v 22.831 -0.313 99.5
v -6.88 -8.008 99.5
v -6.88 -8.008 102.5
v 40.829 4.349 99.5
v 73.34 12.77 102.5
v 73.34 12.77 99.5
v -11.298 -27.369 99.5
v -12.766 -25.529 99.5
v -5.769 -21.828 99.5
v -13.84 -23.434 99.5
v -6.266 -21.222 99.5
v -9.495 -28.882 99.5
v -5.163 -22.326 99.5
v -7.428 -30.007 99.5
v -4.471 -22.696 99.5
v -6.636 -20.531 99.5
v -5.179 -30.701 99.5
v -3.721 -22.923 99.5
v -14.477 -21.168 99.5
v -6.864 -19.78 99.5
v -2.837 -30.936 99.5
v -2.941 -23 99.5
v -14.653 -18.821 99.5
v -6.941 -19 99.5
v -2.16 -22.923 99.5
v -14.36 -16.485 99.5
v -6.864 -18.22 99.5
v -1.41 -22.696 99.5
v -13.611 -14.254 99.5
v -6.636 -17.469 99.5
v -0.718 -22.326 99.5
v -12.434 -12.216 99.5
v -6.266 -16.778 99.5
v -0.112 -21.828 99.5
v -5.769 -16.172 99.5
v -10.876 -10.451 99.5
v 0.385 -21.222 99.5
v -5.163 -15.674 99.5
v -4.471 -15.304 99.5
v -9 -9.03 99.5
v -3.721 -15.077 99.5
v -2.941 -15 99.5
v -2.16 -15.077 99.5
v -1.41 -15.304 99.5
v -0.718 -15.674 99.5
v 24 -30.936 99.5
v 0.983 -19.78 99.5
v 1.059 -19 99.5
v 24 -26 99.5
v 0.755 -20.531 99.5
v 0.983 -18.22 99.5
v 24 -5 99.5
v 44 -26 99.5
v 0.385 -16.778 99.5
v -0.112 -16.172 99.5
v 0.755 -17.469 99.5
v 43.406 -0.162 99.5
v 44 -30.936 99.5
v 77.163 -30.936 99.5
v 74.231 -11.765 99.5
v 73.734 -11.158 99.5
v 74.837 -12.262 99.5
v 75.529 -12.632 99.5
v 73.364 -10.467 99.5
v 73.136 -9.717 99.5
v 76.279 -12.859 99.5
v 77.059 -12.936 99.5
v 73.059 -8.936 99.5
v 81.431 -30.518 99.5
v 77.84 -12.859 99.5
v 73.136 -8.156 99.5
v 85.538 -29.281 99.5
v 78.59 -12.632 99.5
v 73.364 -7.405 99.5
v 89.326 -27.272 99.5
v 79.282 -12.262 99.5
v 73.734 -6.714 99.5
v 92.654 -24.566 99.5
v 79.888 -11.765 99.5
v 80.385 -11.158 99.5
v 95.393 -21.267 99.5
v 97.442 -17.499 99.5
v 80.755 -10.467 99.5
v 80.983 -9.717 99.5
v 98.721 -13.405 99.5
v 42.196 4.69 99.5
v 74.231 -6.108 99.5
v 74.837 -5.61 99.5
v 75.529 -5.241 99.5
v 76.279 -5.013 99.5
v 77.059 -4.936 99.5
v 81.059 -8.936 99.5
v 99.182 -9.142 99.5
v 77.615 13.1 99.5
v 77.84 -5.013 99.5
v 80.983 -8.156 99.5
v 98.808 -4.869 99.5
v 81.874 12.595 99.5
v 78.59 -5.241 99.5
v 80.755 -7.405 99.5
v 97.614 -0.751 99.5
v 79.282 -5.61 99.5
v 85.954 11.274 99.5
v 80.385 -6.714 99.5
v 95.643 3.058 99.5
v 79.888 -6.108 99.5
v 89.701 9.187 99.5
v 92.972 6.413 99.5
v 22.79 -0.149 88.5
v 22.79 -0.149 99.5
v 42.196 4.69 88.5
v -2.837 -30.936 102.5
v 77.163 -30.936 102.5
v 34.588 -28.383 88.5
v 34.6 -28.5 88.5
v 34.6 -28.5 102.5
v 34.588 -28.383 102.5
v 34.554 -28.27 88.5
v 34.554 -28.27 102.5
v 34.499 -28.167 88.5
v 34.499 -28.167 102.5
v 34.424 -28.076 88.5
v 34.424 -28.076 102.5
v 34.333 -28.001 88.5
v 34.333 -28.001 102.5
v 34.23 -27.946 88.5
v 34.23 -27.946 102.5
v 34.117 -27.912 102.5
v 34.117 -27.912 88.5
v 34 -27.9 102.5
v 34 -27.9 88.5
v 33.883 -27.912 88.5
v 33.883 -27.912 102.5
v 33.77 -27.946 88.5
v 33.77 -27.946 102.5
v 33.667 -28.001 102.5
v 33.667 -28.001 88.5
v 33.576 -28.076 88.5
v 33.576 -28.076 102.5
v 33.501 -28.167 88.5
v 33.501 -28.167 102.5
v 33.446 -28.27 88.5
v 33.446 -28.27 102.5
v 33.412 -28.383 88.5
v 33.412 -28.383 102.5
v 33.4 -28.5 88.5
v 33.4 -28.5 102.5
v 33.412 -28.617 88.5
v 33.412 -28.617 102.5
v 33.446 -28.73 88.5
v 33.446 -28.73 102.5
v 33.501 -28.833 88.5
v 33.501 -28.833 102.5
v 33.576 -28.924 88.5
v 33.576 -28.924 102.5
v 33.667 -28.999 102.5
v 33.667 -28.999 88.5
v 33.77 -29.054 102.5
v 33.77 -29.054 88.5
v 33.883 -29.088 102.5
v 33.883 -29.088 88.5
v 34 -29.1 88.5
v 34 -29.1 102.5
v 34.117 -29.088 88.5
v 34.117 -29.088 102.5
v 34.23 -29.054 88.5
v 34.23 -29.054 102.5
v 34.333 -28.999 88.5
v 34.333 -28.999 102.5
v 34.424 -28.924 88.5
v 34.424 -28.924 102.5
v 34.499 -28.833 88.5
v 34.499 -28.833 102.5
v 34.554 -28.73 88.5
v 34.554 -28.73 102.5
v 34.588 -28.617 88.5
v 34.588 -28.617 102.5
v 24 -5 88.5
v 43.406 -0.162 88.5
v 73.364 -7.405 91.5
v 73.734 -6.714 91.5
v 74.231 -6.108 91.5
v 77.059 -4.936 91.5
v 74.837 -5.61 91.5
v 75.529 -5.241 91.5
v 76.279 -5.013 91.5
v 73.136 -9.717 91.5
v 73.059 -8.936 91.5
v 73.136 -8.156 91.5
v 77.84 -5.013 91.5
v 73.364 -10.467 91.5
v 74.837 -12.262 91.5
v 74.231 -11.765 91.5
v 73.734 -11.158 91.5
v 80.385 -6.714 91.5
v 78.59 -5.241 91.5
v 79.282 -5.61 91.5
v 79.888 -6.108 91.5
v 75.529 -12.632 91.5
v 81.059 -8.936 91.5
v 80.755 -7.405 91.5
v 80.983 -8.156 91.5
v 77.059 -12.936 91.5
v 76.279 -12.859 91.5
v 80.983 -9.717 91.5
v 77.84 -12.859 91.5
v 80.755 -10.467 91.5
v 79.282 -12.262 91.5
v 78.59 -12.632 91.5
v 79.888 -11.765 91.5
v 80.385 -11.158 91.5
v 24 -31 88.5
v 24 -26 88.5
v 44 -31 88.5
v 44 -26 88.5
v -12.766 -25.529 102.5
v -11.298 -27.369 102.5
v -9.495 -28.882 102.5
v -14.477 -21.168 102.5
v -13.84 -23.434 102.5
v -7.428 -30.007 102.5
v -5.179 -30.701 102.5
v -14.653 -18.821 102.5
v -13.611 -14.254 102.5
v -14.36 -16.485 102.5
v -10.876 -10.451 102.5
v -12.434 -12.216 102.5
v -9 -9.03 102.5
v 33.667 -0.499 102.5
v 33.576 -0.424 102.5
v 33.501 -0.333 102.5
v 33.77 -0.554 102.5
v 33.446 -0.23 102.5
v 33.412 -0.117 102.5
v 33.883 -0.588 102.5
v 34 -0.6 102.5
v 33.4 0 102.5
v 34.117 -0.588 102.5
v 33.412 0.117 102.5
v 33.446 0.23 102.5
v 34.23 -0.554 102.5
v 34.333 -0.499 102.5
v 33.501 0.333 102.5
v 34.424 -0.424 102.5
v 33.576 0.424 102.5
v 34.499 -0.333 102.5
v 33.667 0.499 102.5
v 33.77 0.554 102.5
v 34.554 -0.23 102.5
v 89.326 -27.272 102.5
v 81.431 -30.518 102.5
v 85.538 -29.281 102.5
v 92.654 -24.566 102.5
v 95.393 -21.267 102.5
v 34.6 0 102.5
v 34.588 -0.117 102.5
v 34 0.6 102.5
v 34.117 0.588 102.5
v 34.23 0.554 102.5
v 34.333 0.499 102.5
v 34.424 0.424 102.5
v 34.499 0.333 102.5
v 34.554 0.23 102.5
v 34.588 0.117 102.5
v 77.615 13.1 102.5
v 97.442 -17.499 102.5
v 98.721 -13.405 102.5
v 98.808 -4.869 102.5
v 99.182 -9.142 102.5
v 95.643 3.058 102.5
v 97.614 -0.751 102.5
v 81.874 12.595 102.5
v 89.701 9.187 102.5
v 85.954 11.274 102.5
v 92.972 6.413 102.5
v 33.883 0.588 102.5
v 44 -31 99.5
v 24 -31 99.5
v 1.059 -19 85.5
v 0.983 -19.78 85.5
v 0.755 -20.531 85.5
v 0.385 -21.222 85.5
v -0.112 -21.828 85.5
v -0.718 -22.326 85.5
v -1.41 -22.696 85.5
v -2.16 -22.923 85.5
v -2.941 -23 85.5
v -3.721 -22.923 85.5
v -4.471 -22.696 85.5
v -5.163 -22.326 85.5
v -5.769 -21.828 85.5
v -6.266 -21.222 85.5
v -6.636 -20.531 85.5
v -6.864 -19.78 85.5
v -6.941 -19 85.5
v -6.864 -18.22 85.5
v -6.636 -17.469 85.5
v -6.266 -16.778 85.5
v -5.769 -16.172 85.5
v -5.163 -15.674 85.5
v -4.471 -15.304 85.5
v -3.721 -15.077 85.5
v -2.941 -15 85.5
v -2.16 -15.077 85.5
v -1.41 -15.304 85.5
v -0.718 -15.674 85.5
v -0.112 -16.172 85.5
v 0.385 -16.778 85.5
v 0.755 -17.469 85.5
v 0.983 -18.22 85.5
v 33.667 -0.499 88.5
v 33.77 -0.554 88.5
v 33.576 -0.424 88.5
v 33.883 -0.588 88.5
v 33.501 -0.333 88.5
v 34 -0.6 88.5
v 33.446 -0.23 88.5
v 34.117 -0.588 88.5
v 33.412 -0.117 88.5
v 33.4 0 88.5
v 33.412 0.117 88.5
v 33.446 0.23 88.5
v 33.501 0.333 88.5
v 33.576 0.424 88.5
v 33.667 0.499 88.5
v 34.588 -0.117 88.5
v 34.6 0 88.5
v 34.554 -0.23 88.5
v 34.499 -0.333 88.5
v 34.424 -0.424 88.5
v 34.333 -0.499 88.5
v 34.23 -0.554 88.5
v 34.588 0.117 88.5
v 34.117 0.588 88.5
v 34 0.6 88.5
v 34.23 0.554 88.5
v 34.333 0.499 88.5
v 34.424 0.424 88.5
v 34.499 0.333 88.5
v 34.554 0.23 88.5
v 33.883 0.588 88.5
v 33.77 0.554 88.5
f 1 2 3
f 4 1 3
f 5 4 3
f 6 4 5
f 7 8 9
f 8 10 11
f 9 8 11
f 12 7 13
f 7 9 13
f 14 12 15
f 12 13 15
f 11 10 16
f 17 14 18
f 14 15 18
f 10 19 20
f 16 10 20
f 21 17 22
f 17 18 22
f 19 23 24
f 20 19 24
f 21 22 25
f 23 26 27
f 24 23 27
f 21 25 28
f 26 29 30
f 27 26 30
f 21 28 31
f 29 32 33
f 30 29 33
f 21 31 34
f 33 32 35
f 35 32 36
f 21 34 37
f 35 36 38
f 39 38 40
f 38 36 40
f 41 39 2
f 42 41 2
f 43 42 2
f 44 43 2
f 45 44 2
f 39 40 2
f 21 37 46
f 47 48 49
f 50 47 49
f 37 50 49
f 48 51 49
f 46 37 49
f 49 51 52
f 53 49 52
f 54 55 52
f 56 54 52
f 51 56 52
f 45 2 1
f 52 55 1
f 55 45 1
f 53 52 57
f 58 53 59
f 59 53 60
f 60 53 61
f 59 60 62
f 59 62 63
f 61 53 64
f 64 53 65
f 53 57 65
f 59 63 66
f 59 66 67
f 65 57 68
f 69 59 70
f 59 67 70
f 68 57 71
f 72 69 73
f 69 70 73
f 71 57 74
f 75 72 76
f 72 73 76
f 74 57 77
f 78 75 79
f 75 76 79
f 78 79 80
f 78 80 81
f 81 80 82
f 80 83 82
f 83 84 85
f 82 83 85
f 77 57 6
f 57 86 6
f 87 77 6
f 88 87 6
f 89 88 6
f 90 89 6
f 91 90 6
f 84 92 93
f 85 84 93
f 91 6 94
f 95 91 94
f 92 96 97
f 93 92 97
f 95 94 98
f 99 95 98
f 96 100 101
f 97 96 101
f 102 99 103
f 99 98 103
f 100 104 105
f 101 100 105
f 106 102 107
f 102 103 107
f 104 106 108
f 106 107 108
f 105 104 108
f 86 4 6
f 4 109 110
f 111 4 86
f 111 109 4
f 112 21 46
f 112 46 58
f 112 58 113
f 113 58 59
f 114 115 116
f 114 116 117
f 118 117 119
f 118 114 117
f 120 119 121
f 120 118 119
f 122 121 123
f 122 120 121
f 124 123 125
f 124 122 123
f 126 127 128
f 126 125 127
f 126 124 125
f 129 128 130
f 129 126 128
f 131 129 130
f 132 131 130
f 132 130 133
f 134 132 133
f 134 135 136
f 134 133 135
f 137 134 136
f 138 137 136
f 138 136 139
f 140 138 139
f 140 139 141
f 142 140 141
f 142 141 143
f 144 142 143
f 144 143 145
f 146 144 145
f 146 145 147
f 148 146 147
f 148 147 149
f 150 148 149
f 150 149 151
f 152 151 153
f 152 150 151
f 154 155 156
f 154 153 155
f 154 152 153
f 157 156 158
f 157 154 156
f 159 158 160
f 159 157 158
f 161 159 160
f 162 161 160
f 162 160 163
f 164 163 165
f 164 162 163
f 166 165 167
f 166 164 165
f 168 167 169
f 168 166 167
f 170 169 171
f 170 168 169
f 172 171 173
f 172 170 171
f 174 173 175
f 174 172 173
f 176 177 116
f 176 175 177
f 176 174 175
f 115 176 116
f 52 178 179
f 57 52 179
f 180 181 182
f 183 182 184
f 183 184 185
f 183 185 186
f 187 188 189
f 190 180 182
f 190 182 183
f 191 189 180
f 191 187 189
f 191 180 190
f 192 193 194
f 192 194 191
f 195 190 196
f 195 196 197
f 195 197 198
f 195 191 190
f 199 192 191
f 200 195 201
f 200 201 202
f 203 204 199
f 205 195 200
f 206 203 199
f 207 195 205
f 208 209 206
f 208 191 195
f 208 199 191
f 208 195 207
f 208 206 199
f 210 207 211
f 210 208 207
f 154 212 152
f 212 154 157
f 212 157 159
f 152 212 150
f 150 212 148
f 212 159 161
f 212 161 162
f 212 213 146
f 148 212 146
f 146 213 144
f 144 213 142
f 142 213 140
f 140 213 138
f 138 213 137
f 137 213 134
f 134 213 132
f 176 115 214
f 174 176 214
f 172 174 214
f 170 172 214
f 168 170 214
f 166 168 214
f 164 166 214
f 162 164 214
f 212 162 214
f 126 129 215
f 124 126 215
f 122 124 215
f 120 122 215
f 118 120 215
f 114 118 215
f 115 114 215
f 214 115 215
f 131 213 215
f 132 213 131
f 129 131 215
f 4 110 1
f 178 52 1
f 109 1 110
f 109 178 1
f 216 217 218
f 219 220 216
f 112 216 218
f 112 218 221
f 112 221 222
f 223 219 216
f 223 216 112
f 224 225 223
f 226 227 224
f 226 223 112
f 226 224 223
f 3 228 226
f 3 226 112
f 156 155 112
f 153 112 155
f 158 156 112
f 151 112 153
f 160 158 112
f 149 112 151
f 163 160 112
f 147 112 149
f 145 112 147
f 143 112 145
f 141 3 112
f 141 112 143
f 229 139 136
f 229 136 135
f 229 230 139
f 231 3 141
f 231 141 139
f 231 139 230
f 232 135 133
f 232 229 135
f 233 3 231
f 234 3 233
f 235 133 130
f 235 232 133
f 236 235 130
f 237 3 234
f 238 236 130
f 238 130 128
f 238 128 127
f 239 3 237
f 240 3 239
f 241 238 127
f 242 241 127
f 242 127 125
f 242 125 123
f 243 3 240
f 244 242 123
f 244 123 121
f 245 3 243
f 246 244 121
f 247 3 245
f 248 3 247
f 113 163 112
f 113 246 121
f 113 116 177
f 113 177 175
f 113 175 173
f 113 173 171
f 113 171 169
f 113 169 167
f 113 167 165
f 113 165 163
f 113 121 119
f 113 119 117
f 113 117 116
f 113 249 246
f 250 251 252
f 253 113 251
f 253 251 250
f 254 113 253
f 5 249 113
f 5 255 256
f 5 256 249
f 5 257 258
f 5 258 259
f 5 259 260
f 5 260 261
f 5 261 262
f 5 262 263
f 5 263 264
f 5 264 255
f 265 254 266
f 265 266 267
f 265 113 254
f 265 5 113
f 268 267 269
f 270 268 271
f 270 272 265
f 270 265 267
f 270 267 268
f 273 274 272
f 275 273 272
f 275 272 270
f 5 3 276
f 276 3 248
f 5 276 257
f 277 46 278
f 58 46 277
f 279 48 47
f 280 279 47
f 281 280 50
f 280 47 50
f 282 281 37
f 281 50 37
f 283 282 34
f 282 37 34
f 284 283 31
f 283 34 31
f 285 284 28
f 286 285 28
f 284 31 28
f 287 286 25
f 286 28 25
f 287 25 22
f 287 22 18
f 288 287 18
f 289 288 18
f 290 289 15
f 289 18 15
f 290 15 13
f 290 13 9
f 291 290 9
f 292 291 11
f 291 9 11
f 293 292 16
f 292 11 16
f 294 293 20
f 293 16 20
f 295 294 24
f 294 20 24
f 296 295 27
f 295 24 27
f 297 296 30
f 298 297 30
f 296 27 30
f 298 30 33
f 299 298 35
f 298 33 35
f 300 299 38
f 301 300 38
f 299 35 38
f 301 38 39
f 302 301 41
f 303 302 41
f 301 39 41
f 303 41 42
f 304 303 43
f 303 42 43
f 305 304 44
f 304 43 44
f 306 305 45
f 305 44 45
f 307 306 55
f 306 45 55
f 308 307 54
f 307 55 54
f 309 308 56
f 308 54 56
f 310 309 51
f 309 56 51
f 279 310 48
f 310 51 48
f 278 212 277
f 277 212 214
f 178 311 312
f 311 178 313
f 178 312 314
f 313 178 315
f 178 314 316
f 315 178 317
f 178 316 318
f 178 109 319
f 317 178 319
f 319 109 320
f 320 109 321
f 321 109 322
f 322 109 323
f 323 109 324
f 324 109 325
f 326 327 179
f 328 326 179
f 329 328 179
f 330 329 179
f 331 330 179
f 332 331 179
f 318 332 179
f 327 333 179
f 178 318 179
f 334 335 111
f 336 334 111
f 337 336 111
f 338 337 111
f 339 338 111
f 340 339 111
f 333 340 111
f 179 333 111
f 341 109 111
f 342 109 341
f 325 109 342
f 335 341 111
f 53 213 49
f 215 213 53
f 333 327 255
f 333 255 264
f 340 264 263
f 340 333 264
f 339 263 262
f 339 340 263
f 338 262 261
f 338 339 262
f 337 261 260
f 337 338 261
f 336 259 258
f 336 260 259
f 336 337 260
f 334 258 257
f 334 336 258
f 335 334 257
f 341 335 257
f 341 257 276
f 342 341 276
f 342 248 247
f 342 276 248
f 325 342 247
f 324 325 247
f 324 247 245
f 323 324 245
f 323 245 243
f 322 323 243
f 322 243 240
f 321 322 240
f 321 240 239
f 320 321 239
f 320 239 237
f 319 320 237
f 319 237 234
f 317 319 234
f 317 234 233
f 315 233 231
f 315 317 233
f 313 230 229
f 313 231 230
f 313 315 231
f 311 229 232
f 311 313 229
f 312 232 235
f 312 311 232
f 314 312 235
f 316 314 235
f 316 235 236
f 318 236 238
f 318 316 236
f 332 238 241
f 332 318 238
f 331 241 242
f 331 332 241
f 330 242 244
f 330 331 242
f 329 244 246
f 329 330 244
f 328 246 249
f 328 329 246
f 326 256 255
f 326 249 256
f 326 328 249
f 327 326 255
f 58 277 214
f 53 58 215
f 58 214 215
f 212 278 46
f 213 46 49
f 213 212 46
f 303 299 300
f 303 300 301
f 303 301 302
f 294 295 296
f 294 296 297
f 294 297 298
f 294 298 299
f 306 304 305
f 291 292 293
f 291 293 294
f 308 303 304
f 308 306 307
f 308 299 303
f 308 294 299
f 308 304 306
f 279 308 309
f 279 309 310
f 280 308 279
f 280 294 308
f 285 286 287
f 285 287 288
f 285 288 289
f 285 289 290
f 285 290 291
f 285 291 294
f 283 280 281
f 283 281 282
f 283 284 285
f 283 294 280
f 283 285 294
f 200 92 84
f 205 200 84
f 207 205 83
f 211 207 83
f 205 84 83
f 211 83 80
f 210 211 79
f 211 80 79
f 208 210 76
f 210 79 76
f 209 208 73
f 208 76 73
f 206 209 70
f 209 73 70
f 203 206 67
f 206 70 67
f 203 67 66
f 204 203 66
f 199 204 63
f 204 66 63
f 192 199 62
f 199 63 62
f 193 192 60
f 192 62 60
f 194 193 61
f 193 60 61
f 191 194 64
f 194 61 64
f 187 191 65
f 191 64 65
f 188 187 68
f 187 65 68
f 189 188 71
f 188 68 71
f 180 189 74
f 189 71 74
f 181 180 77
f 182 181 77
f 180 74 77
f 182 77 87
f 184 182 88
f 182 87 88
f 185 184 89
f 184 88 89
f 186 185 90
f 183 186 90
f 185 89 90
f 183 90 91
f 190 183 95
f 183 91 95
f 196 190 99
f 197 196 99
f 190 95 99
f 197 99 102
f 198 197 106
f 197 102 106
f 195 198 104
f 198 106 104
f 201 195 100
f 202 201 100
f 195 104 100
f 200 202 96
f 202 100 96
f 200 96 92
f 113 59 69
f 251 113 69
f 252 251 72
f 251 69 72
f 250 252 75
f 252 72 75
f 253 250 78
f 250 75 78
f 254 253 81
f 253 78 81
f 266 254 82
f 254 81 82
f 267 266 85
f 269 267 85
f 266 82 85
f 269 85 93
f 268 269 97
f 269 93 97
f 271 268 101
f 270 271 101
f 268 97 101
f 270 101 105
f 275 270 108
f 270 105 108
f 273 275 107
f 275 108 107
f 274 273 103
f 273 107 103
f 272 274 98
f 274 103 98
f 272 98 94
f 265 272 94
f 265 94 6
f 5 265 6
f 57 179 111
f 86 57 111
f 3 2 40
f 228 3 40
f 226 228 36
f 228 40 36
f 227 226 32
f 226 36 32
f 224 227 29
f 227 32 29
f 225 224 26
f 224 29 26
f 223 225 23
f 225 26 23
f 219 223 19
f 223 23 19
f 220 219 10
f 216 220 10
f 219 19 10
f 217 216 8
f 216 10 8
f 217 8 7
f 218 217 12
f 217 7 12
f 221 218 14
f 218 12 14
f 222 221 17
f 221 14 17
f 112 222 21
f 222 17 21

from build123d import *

# Parameters (mm, degrees)
CYLINDER012_R          = 0.6
CYLINDER012_DEPTH      = 20
CYLINDER011_R          = 0.6
CYLINDER011_DEPTH      = 20
BOX010_W               = 20
BOX010_H               = 5
BOX010_DEPTH           = 11
PAD001_DEPTH           = 3
SKETCH005_R            = 4
PAD002_DEPTH           = 8
SKETCH006_R            = 4
PAD003_DEPTH           = 14
BOX009_W               = 20
BOX009_H               = 5
BOX009_DEPTH           = 11
BOX009_PLACEMENT_ANGLE = 14


with BuildPart() as cylinder047:
    # Cylinder012 → Cylinder012 (new body)
    with BuildSketch(Plane(origin=(55, 19, -5), x_dir=(1, 0, 0), z_dir=(0, 0, 1))):
        Circle(CYLINDER012_R)
    extrude(amount=CYLINDER012_DEPTH)


with BuildPart() as cylinder046:
    # Cylinder011 → Cylinder011 (new body)
    with BuildSketch(Plane(origin=(55, -9.5, -5), x_dir=(1, 0, 0), z_dir=(0, 0, 1))):
        Circle(CYLINDER011_R)
    extrude(amount=CYLINDER011_DEPTH)


with BuildPart() as cube010:
    # Box010 → Box010 (new body)
    with BuildSketch(Plane(origin=(45, -12, -0.5), x_dir=(1, 0, 0), z_dir=(0, 0, 1))):
        with Locations((10, 2.5)):
            Rectangle(BOX010_W, BOX010_H)
    extrude(amount=BOX010_DEPTH)


with BuildPart() as pad003:
    # Sketch004 → Pad001 (new body)
    with BuildSketch(Plane.XY.offset(10.5)):
        with BuildLine():
            ThreePointArc((14.120466, 10.991566), (6.522754, -2.168145), (18.163211, -11.935589))
            Line((18.163211, -11.935589), (98.163211, -11.935589))
            ThreePointArc((98.163211, -11.935589), (120.099455, 12.003546), (94.339546, 31.769884))
            Line((14.120466, 10.991566), (94.339546, 31.769884))
        make_face()
    extrude(amount=PAD001_DEPTH)

    # Sketch005 → Pad002 (new body)
    with BuildSketch(Plane(origin=(0, 0, 10.5), x_dir=(1, 0, 0), z_dir=(0, 0, -1))):
        with Locations((98.0594, -10.0638)):
            Circle(SKETCH005_R)
    extrude(amount=PAD002_DEPTH)

    # Sketch006 → Pad003 (new body)
    with BuildSketch(Plane(origin=(0, 0, 10.5), x_dir=(1, 0, 0), z_dir=(0, 0, -1))):
        with Locations((18.0594, 0)):
            Circle(SKETCH006_R)
    extrude(amount=PAD003_DEPTH)


with BuildPart() as tapa_con_taladros:
    # Box009 → Box009 (new body)
    with BuildSketch(Plane.XY):
        with Locations((10, 2.5)):
            Rectangle(BOX009_W, BOX009_H)
    extrude(amount=BOX009_DEPTH)


with BuildPart() as tapa_con_taladros_1:
    # Box009 placement: moved
    add(tapa_con_taladros.part.moved(Location((45, 14, -0.5))).rotate(Axis((45, 14, -0.5), (0, 0, 1)), BOX009_PLACEMENT_ANGLE))

    # Fusion005: union Cube010, Pad003
    add(cube010.part)
    add(pad003.part)

    # Cut011: cut Cylinder046
    add(cylinder046.part, mode=Mode.SUBTRACT)

    # Cut012: cut Cylinder047
    add(cylinder047.part, mode=Mode.SUBTRACT)


with BuildPart() as tapa_con_taladros_2:
    # Cut012 placement: moved
    add(tapa_con_taladros_1.part.moved(Location((-21, -19, 89))))


solid = tapa_con_taladros_2.part
